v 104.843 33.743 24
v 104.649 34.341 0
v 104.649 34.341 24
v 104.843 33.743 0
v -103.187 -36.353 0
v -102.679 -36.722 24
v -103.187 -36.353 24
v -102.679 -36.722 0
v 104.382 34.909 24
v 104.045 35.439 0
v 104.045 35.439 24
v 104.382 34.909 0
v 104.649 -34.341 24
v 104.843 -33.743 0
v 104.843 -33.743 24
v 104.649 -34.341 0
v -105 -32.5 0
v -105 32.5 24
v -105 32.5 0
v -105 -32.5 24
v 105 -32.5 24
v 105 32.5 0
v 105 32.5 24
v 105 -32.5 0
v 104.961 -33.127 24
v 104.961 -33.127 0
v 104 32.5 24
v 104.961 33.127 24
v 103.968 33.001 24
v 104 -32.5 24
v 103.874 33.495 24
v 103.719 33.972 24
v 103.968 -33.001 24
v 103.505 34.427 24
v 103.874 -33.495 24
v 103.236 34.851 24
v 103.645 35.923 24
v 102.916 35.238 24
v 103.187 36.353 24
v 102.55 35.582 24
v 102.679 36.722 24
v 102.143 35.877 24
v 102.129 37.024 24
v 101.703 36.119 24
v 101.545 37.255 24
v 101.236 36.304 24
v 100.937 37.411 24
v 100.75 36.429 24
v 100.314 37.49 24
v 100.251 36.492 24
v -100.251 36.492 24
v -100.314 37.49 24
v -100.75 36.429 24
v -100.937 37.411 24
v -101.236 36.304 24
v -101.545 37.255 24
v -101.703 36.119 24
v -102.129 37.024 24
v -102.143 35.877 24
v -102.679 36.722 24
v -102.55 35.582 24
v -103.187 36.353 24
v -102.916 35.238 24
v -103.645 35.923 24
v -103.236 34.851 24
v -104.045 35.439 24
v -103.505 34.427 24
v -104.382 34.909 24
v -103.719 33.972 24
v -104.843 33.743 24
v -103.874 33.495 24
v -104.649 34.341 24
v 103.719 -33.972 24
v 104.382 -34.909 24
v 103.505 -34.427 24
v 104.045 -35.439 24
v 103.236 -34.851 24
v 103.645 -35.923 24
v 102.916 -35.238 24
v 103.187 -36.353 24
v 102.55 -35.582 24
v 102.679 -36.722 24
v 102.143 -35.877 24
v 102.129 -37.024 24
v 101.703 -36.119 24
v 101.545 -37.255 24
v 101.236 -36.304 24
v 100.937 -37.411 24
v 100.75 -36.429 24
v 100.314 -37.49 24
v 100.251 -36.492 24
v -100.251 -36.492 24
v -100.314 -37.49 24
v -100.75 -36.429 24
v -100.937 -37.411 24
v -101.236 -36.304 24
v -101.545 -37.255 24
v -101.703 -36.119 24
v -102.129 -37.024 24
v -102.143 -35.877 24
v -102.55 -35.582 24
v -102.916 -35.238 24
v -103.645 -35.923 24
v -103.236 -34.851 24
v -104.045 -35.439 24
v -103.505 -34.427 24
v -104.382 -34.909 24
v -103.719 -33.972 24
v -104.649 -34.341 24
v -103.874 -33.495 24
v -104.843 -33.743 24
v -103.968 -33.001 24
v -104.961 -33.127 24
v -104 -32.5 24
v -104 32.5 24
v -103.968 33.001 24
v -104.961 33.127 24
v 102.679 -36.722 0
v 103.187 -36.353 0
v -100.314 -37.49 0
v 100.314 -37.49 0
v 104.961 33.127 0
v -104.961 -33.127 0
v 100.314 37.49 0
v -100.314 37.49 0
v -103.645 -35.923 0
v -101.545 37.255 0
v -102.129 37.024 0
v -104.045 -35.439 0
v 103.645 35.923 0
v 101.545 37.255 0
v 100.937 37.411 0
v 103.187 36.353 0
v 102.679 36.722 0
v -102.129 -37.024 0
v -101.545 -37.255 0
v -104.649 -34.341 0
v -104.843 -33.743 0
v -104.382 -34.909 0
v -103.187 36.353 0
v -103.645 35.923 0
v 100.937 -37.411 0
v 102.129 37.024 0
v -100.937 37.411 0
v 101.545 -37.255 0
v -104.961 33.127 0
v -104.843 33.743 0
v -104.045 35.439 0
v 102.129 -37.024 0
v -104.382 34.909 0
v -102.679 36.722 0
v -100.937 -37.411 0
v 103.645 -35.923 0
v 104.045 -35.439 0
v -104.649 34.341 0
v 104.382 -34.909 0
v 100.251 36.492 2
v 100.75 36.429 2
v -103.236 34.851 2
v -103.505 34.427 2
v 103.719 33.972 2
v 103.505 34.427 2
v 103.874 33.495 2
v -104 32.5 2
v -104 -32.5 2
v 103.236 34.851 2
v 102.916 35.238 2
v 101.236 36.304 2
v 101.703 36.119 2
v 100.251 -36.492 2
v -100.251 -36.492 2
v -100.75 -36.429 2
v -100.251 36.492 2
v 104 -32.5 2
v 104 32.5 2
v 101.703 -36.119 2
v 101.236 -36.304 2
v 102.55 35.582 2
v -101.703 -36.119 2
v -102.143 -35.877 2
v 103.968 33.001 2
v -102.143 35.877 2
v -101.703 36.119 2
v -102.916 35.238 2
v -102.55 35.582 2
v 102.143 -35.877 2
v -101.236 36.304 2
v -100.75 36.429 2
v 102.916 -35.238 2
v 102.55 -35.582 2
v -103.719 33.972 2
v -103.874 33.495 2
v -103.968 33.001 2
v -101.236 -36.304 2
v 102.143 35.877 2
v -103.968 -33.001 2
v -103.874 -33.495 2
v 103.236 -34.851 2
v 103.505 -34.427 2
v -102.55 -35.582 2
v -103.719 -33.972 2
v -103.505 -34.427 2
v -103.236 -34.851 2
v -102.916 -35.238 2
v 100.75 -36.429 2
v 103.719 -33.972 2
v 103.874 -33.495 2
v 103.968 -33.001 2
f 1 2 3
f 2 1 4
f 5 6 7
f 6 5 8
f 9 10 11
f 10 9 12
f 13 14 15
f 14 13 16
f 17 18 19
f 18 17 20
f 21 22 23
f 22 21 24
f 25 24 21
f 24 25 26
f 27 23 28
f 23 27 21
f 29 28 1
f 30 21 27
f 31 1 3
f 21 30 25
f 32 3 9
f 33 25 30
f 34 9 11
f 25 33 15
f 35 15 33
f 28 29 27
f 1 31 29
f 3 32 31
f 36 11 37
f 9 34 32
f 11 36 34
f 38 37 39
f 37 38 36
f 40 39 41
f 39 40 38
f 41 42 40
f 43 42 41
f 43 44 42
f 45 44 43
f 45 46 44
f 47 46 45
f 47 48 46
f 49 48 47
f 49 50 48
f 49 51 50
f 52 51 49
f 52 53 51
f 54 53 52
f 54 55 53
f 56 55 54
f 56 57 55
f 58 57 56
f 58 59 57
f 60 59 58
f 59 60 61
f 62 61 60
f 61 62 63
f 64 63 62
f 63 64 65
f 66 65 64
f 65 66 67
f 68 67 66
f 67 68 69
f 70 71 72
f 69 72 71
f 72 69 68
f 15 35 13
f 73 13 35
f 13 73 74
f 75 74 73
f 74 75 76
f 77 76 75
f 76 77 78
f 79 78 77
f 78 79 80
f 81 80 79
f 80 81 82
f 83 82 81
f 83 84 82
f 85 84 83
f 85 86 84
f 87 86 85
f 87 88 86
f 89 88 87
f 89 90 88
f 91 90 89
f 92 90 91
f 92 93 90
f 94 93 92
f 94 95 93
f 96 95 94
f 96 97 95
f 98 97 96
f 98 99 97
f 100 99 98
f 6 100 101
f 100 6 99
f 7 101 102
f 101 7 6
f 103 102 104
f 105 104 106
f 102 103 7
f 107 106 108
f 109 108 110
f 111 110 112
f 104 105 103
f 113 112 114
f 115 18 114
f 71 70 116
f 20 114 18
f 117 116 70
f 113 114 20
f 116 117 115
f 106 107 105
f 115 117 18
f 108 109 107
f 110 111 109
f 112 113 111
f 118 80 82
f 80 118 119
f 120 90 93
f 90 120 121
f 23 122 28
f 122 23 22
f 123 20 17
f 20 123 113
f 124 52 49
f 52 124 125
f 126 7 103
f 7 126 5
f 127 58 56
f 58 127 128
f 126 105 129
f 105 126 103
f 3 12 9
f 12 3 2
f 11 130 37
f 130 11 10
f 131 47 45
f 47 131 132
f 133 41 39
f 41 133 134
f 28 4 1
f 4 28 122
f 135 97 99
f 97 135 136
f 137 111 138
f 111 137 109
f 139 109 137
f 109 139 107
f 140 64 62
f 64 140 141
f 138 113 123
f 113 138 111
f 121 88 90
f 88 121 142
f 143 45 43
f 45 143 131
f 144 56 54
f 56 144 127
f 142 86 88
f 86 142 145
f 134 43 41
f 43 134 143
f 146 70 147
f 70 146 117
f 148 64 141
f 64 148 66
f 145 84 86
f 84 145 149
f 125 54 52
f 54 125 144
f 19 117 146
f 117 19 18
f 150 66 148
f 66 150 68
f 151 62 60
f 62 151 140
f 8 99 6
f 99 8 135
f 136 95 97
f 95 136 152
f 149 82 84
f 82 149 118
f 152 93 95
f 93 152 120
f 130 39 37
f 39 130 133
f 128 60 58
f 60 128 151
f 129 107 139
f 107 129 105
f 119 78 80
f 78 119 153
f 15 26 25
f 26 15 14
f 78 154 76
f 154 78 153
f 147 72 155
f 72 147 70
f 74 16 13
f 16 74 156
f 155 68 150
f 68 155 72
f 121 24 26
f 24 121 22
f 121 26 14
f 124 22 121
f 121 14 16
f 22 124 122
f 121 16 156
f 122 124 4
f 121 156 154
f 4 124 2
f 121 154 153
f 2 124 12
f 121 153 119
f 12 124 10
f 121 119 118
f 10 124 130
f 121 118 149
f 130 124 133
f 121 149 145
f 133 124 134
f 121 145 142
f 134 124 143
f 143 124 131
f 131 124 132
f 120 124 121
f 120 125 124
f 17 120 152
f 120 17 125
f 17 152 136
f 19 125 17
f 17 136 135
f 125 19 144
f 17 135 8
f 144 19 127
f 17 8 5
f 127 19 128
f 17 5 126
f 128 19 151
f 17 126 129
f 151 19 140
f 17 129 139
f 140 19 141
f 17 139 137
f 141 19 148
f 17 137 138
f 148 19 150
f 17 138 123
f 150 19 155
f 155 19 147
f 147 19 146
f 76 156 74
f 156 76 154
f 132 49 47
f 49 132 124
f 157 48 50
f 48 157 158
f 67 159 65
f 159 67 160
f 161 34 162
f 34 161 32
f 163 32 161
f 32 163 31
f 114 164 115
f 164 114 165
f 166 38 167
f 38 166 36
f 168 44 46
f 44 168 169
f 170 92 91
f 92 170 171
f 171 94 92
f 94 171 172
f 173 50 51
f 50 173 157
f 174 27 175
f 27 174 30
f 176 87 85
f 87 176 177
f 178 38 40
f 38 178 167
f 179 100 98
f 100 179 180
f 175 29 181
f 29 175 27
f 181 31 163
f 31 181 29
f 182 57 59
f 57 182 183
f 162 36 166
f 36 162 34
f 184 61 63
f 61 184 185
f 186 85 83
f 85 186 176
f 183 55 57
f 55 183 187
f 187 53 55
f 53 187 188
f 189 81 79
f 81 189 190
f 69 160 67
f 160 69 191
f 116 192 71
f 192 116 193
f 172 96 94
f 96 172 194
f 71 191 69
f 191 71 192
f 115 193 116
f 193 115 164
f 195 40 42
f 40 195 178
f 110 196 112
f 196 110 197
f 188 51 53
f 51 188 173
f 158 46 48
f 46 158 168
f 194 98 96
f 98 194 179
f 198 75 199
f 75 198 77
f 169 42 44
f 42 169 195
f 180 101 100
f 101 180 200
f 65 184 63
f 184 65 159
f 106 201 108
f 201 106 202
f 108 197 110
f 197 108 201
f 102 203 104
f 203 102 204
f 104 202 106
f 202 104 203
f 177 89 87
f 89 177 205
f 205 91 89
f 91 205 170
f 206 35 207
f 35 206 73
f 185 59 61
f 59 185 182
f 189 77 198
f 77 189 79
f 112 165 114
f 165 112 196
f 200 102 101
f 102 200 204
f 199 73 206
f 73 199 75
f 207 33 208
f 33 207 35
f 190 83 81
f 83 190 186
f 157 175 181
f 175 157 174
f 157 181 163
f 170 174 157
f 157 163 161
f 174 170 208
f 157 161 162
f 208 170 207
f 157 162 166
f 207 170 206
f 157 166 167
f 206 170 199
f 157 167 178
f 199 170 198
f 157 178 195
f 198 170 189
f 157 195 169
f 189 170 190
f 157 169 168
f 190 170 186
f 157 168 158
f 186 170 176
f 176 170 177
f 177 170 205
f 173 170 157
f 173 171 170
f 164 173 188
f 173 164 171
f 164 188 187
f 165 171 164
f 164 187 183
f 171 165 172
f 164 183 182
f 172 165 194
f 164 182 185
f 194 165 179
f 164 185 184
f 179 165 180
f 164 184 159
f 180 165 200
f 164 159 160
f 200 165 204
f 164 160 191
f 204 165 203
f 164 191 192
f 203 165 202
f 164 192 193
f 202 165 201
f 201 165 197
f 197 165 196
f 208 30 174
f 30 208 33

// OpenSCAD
$fn = 50;


difference() {
	union() {
		hull() {
			translate(v = [-100.0000000000, 32.5000000000, 0]) {
				cylinder(h = 24, r = 5);
			}
			translate(v = [100.0000000000, 32.5000000000, 0]) {
				cylinder(h = 24, r = 5);
			}
			translate(v = [-100.0000000000, -32.5000000000, 0]) {
				cylinder(h = 24, r = 5);
			}
			translate(v = [100.0000000000, -32.5000000000, 0]) {
				cylinder(h = 24, r = 5);
			}
		}
	}
	union() {
		translate(v = [0, 0, 2]) {
			hull() {
				translate(v = [-100.0000000000, 32.5000000000, 0]) {
					cylinder(h = 22, r = 4);
				}
				translate(v = [100.0000000000, 32.5000000000, 0]) {
					cylinder(h = 22, r = 4);
				}
				translate(v = [-100.0000000000, -32.5000000000, 0]) {
					cylinder(h = 22, r = 4);
				}
				translate(v = [100.0000000000, -32.5000000000, 0]) {
					cylinder(h = 22, r = 4);
				}
			}
		}
	}
}
